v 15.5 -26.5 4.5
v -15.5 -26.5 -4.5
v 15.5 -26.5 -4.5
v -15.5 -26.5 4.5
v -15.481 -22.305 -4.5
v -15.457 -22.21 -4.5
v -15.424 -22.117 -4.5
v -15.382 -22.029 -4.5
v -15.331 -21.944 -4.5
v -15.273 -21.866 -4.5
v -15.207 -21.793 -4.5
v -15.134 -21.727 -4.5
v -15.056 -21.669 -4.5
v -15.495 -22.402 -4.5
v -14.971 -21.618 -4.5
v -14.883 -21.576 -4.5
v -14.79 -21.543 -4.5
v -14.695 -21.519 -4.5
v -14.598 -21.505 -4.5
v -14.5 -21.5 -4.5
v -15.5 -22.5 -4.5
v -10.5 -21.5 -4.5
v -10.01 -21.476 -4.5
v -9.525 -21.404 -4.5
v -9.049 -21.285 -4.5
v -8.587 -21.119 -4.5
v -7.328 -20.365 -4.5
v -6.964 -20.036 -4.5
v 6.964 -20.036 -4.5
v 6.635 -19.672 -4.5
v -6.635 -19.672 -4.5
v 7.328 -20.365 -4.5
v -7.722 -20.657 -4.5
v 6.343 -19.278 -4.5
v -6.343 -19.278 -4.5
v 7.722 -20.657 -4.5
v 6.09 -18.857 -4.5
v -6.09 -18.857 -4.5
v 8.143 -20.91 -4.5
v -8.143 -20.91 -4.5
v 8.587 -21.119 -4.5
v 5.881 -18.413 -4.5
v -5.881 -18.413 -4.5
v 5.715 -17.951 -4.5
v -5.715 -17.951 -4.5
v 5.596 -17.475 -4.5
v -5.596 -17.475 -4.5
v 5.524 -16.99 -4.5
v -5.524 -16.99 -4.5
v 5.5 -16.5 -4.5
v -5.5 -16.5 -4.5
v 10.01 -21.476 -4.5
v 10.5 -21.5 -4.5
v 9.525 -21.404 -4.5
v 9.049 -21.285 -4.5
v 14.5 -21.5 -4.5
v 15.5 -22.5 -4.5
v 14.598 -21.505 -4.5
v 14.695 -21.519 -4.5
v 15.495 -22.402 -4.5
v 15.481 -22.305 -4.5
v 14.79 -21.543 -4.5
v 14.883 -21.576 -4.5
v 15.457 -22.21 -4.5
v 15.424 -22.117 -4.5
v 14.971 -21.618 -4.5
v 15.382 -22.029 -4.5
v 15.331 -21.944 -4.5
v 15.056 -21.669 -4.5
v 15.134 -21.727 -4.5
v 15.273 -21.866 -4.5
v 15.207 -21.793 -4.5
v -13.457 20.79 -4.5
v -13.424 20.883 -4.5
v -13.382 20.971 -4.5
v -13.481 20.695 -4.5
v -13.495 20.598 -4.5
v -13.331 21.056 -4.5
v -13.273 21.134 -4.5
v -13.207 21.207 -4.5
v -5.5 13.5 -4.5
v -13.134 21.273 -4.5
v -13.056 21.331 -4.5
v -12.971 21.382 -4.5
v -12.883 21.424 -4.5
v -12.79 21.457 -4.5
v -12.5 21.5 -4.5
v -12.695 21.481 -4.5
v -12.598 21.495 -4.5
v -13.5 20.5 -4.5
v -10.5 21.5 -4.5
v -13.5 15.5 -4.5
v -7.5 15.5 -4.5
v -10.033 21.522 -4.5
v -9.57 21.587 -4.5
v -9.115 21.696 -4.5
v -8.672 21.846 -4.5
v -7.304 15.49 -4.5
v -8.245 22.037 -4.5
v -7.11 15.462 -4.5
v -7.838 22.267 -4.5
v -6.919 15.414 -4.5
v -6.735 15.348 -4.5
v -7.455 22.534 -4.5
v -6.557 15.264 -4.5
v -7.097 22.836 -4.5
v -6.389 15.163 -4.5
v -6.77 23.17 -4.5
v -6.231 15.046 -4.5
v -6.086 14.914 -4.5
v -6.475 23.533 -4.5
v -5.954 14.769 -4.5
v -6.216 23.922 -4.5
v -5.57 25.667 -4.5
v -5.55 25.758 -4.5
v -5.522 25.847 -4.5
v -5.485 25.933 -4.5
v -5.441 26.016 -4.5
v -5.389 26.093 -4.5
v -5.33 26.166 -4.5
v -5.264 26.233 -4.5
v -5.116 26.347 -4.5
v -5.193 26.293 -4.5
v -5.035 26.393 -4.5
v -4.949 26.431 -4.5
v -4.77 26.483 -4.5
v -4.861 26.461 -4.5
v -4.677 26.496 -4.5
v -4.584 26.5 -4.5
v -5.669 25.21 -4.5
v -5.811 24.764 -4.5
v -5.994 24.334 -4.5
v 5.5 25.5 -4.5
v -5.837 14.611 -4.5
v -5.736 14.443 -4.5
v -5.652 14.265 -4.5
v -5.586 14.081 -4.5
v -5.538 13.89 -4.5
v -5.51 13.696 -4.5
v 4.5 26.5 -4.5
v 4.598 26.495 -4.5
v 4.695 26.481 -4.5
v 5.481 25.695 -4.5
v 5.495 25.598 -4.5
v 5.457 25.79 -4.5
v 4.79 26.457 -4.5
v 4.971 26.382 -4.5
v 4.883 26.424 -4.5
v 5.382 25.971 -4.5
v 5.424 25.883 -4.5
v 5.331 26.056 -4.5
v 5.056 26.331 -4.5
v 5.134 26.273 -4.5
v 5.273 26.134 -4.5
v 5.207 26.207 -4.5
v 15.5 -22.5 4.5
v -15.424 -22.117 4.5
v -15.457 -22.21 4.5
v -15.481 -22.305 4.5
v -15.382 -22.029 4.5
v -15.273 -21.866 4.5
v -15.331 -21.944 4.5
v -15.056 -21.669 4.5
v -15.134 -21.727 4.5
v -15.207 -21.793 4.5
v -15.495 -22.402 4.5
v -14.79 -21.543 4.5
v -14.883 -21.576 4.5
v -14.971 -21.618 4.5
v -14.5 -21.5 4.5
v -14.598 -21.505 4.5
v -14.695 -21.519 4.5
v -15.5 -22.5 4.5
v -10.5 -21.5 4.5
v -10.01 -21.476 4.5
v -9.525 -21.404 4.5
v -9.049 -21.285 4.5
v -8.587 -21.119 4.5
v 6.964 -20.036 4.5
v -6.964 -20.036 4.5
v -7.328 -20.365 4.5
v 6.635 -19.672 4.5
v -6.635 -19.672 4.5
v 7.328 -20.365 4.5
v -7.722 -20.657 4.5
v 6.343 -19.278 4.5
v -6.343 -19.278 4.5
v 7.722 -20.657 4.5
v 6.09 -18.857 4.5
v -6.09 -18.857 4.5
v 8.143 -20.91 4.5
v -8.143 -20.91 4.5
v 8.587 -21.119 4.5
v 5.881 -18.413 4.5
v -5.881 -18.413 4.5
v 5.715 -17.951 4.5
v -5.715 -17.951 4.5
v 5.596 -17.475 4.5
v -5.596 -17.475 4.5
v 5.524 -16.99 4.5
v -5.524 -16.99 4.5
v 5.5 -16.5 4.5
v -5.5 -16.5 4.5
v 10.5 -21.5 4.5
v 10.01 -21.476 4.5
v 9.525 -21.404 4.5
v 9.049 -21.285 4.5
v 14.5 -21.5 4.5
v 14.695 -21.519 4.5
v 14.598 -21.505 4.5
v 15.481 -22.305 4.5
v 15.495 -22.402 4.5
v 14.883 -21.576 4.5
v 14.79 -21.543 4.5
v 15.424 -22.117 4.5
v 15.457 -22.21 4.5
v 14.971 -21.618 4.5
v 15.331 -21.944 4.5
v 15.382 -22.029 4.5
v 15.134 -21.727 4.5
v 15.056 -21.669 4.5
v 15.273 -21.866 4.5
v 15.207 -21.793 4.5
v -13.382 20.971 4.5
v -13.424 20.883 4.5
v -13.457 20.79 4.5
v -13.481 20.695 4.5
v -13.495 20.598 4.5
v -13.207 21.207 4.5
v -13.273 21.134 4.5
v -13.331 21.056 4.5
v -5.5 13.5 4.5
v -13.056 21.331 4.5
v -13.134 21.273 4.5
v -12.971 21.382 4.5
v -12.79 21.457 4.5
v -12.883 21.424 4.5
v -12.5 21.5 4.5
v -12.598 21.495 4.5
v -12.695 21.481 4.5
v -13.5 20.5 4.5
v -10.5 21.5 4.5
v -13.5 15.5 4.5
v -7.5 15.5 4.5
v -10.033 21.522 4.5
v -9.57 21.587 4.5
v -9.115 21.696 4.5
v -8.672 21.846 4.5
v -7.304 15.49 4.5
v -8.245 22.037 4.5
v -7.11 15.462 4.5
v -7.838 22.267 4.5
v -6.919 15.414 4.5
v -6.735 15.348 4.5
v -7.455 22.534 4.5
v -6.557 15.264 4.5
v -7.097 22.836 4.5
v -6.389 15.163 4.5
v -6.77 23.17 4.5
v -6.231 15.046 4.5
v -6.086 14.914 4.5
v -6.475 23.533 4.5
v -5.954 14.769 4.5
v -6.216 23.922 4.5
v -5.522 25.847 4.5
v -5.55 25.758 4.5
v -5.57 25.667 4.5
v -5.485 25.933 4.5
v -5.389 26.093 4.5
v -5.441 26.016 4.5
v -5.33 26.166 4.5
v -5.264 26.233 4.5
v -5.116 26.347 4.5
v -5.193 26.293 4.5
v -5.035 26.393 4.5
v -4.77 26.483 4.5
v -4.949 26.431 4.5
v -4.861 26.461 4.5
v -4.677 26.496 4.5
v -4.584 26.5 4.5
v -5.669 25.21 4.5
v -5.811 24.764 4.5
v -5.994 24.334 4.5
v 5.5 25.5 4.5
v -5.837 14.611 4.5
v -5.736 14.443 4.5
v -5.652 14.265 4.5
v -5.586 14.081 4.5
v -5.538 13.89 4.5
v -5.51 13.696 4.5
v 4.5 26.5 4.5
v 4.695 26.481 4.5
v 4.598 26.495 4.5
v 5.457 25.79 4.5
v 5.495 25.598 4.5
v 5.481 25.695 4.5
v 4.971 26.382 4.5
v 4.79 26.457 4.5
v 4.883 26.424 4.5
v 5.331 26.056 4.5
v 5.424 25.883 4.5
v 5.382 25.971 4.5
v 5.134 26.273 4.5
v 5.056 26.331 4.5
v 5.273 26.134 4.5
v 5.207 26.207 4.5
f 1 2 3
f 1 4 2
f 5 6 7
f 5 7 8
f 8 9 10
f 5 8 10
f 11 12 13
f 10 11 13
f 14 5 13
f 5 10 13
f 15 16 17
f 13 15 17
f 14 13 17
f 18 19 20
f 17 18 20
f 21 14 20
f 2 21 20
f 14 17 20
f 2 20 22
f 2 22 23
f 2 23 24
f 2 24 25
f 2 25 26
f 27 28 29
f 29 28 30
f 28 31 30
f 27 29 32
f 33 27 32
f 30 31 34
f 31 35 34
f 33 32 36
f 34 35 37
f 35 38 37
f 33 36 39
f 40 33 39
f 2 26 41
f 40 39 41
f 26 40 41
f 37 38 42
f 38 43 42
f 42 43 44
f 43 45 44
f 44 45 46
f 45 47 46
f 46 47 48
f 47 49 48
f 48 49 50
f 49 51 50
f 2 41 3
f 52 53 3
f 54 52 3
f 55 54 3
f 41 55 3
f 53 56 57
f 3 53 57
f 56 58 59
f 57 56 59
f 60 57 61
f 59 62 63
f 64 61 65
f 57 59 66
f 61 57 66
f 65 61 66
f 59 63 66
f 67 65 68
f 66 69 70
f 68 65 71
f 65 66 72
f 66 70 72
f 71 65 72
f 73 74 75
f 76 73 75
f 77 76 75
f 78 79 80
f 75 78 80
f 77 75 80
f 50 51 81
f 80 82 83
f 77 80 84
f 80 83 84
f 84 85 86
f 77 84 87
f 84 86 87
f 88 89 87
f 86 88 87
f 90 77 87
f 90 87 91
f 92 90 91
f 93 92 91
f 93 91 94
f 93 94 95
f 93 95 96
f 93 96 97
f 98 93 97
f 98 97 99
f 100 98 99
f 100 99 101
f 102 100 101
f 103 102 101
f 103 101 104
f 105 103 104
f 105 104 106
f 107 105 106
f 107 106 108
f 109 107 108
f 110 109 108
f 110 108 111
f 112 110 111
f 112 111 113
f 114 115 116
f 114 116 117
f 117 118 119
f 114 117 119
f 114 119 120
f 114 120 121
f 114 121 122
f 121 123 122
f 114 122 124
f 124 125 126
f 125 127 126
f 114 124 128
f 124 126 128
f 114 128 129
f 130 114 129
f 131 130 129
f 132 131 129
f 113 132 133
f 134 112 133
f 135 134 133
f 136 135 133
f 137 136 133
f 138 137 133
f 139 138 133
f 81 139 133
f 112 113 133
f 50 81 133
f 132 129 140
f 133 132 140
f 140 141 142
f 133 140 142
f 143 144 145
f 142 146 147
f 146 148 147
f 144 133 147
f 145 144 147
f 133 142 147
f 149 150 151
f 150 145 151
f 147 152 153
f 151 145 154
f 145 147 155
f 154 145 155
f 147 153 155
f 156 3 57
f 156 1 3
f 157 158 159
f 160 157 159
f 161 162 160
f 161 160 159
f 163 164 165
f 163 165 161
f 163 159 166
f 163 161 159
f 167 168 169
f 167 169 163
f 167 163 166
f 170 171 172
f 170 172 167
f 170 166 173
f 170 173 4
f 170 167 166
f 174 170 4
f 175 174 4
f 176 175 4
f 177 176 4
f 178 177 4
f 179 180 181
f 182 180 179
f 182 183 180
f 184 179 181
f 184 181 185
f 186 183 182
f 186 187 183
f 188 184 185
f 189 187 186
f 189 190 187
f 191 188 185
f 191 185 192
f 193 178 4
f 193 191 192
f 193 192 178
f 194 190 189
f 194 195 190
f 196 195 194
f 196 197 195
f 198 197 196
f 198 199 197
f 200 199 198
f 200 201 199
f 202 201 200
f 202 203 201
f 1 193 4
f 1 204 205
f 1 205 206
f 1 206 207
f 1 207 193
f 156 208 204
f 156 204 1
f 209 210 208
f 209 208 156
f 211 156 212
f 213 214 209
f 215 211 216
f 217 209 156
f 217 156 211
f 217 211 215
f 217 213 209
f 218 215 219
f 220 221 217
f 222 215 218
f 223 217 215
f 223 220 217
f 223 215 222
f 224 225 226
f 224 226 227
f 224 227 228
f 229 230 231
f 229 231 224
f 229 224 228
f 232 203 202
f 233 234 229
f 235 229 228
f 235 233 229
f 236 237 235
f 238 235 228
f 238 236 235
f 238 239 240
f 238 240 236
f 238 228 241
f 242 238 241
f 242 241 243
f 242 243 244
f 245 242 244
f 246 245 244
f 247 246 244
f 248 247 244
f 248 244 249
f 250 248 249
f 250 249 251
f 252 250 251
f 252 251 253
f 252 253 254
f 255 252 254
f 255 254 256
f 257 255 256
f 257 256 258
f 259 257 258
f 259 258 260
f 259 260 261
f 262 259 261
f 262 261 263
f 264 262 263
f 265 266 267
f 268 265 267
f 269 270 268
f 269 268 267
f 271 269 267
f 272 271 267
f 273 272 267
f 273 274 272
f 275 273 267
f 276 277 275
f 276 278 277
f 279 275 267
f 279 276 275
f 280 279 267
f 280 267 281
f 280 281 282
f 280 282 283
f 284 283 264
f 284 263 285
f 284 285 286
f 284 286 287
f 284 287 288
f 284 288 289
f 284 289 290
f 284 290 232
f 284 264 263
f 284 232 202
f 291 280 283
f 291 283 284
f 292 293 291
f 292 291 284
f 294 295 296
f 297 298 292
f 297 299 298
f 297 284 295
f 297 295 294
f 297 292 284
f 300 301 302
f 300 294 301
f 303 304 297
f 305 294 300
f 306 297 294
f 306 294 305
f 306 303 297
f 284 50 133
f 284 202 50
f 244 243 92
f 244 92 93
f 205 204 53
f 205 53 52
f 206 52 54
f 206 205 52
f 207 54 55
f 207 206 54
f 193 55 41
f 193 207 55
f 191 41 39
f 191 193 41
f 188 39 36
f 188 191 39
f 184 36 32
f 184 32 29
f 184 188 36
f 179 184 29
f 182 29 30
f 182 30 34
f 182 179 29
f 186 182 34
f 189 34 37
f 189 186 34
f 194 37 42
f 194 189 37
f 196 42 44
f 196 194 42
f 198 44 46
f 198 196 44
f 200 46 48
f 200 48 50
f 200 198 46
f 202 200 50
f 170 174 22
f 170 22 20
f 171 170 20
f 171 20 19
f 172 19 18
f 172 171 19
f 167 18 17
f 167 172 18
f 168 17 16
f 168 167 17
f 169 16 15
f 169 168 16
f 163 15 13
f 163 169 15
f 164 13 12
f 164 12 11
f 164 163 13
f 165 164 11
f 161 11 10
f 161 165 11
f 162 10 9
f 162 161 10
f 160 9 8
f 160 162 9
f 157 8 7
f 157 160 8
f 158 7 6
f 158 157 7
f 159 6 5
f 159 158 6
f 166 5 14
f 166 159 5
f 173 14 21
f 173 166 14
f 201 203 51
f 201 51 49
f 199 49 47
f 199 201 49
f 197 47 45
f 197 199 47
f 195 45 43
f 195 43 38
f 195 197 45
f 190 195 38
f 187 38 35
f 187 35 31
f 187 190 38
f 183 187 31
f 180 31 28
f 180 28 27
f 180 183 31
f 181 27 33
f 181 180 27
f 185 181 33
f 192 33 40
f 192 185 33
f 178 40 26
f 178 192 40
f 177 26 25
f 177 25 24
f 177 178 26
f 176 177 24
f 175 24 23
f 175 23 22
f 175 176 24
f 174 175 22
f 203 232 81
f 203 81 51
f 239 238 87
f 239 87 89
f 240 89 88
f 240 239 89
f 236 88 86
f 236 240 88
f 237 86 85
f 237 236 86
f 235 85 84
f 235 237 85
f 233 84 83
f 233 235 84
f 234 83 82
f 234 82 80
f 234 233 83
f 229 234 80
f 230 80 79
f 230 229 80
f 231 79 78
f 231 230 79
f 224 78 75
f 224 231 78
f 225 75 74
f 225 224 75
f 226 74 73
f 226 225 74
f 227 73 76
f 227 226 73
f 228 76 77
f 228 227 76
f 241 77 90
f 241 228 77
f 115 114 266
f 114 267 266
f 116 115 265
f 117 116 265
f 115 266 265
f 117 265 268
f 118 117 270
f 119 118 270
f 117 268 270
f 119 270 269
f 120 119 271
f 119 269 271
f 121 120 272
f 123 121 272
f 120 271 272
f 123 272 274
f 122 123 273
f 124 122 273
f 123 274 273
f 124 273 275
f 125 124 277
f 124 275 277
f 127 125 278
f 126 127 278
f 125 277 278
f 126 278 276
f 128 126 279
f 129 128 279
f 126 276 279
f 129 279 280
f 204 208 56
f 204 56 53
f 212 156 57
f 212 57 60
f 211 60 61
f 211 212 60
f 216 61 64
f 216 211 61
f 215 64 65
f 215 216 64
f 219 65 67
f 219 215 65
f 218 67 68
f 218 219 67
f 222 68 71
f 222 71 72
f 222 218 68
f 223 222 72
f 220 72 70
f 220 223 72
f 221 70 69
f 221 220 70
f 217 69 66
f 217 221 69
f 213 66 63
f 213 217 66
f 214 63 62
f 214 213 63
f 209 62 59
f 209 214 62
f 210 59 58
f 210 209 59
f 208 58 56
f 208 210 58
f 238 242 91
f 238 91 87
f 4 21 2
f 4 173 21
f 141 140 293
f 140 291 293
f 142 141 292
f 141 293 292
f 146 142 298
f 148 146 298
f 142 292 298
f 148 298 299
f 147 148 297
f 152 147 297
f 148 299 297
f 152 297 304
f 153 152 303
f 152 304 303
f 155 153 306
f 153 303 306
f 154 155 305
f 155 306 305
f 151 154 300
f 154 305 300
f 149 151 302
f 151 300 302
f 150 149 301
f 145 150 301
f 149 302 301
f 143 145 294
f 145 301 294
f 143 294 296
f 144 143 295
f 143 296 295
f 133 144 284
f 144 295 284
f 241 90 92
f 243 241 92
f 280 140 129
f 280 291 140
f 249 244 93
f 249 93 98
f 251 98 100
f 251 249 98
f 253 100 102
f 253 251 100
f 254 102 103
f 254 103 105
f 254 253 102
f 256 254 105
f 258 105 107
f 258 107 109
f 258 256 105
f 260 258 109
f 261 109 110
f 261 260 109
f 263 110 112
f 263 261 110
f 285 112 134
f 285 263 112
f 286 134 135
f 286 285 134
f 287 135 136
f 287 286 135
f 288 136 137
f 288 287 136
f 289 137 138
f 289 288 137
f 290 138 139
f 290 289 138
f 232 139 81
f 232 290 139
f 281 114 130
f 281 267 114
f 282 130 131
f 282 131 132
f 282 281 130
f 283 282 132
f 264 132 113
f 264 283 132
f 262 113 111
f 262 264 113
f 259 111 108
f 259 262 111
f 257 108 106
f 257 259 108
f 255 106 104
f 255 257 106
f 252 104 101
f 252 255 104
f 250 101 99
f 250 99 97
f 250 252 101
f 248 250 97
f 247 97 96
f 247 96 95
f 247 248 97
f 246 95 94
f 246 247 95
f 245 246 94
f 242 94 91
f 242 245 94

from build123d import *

# Parameters (mm, degrees)
F1_DEPTH = 4.5
F2_R     = 1


with BuildPart() as f1:
    # F0 (on Top) → F1 (new body, symmetric)
    with BuildSketch(Plane.XY):
        with BuildLine():
            Line((-5.5, -26.5), (5.5, -26.5))
            Line((5.5, -26.5), (15.5, -26.5))
            Line((15.5, -26.5), (15.5, -22.5))
            ThreePointArc((15.5, -22.5), (15.2071067812, -21.7928932188), (14.5, -21.5))
            Line((14.5, -21.5), (10.5, -21.5))
            ThreePointArc((10.5, -21.5), (6.9644660941, -20.0355339059), (5.5, -16.5))
            Line((5.5, -16.5), (5.5, 26.5))
            Line((5.5, 26.5), (-5.5, 26.5))
            ThreePointArc((-5.5, 26.5), (-6.9644660941, 22.9644660941), (-10.5, 21.5))
            Line((-10.5, 21.5), (-12.5, 21.5))
            ThreePointArc((-12.5, 21.5), (-13.2071067812, 21.2071067812), (-13.5, 20.5))
            Line((-13.5, 20.5), (-13.5, 15.5))
            Line((-13.5, 15.5), (-7.5, 15.5))
            ThreePointArc((-7.5, 15.5), (-6.0857864376, 14.9142135624), (-5.5, 13.5))
            Line((-5.5, 13.5), (-5.5, -16.5))
            ThreePointArc((-5.5, -16.5), (-6.9644660941, -20.0355339059), (-10.5, -21.5))
            Line((-10.5, -21.5), (-14.5, -21.5))
            ThreePointArc((-14.5, -21.5), (-15.2071067812, -21.7928932188), (-15.5, -22.5))
            Line((-15.5, -22.5), (-15.5, -26.5))
            Line((-15.5, -26.5), (-5.5, -26.5))
        make_face()
    extrude(amount=F1_DEPTH, both=True)

    # F2
    f2_edges = [f1.edges().sort_by_distance(p)[0] for p in [
        (5.5, 26.5, 0),
        (-5.5, 26.5, 0),
    ]]
    fillet(f2_edges, radius=F2_R)


solid = f1.part
